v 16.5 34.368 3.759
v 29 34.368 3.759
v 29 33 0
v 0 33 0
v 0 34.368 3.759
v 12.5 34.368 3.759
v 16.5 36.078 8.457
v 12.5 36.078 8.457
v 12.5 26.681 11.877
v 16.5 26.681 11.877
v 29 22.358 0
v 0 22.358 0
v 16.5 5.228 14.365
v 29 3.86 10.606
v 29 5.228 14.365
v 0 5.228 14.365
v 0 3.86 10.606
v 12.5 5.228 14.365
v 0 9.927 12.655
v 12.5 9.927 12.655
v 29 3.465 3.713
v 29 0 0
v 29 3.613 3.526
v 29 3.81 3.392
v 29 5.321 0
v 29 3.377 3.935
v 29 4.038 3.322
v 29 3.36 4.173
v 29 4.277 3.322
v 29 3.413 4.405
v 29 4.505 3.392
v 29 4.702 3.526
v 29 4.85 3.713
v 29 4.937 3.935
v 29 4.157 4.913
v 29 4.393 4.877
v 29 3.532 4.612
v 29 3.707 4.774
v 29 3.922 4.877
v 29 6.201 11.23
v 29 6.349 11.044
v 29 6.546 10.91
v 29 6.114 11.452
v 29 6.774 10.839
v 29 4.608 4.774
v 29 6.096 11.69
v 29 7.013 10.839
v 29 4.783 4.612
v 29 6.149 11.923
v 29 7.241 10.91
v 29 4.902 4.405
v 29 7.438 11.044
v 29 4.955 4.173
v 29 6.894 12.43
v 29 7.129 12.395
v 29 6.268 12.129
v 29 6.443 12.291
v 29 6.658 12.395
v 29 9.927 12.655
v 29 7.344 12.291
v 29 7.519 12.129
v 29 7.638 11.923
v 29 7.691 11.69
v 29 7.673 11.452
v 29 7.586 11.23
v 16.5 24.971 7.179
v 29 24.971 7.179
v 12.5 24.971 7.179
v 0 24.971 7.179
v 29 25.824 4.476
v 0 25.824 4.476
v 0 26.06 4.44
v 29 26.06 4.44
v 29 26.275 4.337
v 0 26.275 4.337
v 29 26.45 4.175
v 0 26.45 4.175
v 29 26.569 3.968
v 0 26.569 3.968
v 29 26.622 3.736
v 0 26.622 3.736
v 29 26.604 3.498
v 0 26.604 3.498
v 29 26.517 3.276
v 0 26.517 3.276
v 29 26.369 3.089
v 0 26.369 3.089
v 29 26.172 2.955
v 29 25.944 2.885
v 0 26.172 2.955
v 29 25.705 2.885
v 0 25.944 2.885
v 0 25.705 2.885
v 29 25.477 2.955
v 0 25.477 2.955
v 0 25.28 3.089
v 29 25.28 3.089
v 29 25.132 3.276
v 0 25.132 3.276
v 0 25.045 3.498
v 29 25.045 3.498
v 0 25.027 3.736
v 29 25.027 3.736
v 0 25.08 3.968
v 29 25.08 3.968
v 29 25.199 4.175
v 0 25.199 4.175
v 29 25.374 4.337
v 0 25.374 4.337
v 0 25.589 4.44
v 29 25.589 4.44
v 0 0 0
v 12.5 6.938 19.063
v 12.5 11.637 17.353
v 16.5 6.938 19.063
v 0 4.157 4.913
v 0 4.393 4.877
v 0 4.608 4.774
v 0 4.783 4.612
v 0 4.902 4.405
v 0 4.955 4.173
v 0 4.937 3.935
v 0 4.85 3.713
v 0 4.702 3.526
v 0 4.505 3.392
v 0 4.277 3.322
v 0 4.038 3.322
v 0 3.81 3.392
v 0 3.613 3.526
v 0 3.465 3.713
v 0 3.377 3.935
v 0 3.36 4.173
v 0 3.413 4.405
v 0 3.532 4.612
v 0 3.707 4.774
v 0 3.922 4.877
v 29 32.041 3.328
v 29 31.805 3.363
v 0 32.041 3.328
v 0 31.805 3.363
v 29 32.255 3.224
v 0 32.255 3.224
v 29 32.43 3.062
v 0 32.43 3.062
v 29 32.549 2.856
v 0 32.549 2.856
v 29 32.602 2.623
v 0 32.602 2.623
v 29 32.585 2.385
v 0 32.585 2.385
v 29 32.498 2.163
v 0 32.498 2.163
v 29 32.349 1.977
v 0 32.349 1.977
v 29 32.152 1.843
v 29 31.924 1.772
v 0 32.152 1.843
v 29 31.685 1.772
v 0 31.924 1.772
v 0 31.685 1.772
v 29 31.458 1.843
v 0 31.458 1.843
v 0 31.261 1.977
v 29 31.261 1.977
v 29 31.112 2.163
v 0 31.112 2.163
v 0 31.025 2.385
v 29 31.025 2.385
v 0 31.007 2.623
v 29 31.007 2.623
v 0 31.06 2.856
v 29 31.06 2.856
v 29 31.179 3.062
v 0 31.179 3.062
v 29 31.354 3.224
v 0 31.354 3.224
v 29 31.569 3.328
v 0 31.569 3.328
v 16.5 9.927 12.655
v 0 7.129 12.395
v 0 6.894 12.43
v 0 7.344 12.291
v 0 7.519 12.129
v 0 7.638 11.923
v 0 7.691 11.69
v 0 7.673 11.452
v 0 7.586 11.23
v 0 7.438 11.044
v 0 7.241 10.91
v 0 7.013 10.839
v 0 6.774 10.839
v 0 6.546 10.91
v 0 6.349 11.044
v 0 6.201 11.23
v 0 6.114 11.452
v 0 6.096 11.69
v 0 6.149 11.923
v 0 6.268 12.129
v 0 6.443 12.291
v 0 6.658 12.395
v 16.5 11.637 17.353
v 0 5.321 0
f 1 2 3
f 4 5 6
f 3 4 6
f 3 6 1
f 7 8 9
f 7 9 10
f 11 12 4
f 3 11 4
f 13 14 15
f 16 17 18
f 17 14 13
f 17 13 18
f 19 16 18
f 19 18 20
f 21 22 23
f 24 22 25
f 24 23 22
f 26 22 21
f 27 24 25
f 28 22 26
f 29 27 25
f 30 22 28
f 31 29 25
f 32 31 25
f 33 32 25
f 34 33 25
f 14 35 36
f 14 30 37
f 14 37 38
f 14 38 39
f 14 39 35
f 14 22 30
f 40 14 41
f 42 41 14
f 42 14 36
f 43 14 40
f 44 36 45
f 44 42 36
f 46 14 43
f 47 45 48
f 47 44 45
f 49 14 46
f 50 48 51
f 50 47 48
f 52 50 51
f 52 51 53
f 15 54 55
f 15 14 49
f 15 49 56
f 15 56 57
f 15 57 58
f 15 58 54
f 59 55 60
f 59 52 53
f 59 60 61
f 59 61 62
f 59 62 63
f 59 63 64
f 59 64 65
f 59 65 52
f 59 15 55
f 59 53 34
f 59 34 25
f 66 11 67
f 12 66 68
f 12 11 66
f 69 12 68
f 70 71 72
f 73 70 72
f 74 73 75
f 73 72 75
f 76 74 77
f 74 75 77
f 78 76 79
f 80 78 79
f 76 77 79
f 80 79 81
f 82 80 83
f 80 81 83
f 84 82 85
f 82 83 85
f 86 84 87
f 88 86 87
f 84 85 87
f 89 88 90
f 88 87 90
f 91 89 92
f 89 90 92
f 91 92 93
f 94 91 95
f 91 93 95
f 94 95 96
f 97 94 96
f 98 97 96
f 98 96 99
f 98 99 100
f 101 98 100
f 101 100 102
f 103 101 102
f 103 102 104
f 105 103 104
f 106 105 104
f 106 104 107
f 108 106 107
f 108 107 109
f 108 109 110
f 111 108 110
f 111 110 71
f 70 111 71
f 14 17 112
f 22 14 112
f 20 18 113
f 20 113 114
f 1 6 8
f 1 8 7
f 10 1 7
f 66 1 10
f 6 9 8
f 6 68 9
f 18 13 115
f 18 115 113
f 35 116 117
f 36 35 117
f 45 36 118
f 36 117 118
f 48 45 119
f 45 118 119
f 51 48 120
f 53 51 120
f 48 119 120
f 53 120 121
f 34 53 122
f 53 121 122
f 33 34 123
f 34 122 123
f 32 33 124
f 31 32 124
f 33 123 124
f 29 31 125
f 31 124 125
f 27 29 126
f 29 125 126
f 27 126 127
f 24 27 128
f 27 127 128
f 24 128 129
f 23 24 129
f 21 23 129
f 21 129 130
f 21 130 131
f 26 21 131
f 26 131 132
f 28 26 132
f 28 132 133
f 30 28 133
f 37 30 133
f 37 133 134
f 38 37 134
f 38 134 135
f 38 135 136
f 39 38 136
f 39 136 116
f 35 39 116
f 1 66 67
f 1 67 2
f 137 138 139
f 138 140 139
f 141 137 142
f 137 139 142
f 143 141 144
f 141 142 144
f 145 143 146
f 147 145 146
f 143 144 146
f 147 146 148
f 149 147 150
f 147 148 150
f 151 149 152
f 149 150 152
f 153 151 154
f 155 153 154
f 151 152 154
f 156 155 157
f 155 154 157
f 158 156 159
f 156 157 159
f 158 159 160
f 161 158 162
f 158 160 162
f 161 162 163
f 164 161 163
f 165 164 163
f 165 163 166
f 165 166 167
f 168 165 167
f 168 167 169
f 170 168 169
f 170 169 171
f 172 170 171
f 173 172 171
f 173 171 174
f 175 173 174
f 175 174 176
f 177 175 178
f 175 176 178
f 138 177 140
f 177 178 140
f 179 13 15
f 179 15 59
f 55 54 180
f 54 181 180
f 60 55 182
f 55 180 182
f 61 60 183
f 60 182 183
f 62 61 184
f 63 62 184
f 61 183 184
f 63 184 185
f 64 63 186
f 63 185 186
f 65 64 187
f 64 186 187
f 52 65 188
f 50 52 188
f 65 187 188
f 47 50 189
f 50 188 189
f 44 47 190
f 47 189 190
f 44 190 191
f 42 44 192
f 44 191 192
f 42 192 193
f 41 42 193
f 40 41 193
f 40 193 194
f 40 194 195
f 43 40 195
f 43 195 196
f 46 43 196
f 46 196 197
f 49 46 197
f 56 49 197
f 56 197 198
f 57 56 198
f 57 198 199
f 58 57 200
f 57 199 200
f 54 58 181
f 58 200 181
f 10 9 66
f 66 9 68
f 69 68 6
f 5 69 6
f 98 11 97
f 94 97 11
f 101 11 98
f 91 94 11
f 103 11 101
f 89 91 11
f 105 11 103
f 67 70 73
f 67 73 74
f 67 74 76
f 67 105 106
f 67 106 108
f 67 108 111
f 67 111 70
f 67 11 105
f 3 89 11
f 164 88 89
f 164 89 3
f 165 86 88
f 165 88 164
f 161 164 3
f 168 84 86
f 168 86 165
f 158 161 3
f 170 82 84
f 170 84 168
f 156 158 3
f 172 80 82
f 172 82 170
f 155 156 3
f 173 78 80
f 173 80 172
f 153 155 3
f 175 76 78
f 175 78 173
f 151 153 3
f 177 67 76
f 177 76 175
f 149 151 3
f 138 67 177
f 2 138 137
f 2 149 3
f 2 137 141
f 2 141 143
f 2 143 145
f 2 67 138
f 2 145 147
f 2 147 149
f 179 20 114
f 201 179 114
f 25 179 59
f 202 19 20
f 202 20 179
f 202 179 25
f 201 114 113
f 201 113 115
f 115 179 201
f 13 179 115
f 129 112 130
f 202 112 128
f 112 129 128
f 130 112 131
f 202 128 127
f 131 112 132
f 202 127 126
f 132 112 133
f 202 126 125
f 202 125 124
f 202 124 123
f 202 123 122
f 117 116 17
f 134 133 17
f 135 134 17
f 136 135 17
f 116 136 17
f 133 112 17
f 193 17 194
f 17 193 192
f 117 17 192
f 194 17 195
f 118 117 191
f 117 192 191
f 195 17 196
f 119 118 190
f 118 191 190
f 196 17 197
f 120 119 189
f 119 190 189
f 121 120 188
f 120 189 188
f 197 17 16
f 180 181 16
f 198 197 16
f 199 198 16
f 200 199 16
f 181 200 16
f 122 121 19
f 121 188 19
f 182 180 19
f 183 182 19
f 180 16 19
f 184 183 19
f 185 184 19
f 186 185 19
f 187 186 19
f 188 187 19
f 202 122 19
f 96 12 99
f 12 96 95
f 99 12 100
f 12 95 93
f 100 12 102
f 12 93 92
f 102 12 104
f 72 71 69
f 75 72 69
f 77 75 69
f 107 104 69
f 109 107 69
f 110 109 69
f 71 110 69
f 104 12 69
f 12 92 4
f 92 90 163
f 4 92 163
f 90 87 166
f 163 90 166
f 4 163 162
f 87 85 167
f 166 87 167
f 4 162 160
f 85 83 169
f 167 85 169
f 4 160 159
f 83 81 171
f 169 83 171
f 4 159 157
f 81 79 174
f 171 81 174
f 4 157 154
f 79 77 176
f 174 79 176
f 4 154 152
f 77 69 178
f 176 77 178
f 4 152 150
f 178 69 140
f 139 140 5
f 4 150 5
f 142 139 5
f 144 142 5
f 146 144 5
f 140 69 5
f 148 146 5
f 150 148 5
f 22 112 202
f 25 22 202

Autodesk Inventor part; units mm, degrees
ref_plane "YZ Plane" through (0, 0, 0) normal (1, 0, 0) x (0, 1, 0)
ref_plane "XZ Plane" through (0, 0, 0) normal (0, 1, 0) x (-1, 0, 0)
ref_plane "XY Plane" through (0, 0, 0) normal (0, 0, 1) x (1, 0, 0)
sketch "スケッチ1" plane through (0, 0, 0) normal (1, 0, 0) x (0, 1, 0)
  line L0 (0, 0) -> (33, 0)
  line L1 (33, 0) -> (3.8603, 10.606)
  line L2 (3.8603, 10.606) -> (0, 0)
  line L3 (33, 0) -> (3.8603, 10.606)
  line L4 (3.8603, 10.606) -> (5.2283, 14.3648)
  line L5 (5.2283, 14.3648) -> (34.3681, 3.7588)
  line L6 (34.3681, 3.7588) -> (33, 0)
  dimension "d0" = 33
  dimension "d1" = 20
  dimension "d2" = 4
extrude "押し出し1" add sketch "スケッチ1" along normal blind 16.5
sketch "スケッチ2" plane through (0, 5.2283, 14.3648) normal (0, 0.3420201, 0.9396926) x (1, 0, 0)
  line L0 (0, 31.0099) -> (16.5, 31.0099) projected
  line L1 (16.5, 31.0099) -> (16.5, 0) projected
  line L2 (12.5, 31.0099) -> (16.5, 31.0099)
  line L3 (16.5, 31.0099) -> (16.5, 0)
  line L4 (16.5, 0) -> (12.5, 0)
  line L5 (12.5, 0) -> (12.5, 31.0099)
  point P0 (0, 0)
  dimension "d5" = 4
extrude "押し出し2" add sketch "スケッチ2" along normal blind 5
extrude "押し出し3" add sketch "スケッチ1" along normal blind 29
sketch "スケッチ3" plane through (0, 0, 0) normal (-1, 0, 0) x (0, 0, 1)
  line L0 (3.7588, 34.3681) -> (14.3648, 5.2283) projected
  line L1 (7.179, 24.9712) -> (12.6547, 9.9268)
  line L2 (12.6547, 9.9268) -> (0, 5.3209)
  line L3 (0, 5.3209) -> (-5.4757, 20.3652)
  line L4 (-5.4757, 20.3652) -> (7.179, 24.9712)
  line L5 (0, 0) -> (0, 33) projected
  line L6 (0, 33) -> (3.7588, 34.3681) projected
  line L7 (14.3648, 5.2283) -> (0, 0) projected
  circle A0 centre (11.6303, 6.8935) radius 0.8
  circle A1 centre (4.1128, 4.1574) radius 0.8
  circle A2 centre (2.5634, 31.8047) radius 0.8
  circle A3 centre (3.6759, 25.8245) radius 0.8
  line L8 (7.179, 24.9712) -> (12.6547, 9.9268)
  line L9 (12.6547, 9.9268) -> (17.3531, 11.6369)
  line L10 (17.3531, 11.6369) -> (11.8774, 26.6813)
  line L11 (11.8774, 26.6813) -> (7.179, 24.9712)
  point P0 (0, 22.3582)
  dimension "d13" = 10
  dimension "d14" = 5
  dimension "d15" = 1.6
  dimension "d16" = 1.6
  dimension "d17" = 1.6
  dimension "d18" = 1.6
  dimension "d19" = 2.5
  dimension "d20" = 2.5
  dimension "d21" = 2
  dimension "d22" = 3
  dimension "d23" = 2
  dimension "d24" = 2
  dimension "d25" = 2
  dimension "d26" = 10
extrude "押し出し4" cut sketch "スケッチ3" against normal through all contours L11 L10 L9 L0 | L0 L2 L5 L4 | L5 L3 L4 | A0 | A1 | A2 | A3
equation "\"d20\" = d19"
properties part number "chest_cover_bace"
